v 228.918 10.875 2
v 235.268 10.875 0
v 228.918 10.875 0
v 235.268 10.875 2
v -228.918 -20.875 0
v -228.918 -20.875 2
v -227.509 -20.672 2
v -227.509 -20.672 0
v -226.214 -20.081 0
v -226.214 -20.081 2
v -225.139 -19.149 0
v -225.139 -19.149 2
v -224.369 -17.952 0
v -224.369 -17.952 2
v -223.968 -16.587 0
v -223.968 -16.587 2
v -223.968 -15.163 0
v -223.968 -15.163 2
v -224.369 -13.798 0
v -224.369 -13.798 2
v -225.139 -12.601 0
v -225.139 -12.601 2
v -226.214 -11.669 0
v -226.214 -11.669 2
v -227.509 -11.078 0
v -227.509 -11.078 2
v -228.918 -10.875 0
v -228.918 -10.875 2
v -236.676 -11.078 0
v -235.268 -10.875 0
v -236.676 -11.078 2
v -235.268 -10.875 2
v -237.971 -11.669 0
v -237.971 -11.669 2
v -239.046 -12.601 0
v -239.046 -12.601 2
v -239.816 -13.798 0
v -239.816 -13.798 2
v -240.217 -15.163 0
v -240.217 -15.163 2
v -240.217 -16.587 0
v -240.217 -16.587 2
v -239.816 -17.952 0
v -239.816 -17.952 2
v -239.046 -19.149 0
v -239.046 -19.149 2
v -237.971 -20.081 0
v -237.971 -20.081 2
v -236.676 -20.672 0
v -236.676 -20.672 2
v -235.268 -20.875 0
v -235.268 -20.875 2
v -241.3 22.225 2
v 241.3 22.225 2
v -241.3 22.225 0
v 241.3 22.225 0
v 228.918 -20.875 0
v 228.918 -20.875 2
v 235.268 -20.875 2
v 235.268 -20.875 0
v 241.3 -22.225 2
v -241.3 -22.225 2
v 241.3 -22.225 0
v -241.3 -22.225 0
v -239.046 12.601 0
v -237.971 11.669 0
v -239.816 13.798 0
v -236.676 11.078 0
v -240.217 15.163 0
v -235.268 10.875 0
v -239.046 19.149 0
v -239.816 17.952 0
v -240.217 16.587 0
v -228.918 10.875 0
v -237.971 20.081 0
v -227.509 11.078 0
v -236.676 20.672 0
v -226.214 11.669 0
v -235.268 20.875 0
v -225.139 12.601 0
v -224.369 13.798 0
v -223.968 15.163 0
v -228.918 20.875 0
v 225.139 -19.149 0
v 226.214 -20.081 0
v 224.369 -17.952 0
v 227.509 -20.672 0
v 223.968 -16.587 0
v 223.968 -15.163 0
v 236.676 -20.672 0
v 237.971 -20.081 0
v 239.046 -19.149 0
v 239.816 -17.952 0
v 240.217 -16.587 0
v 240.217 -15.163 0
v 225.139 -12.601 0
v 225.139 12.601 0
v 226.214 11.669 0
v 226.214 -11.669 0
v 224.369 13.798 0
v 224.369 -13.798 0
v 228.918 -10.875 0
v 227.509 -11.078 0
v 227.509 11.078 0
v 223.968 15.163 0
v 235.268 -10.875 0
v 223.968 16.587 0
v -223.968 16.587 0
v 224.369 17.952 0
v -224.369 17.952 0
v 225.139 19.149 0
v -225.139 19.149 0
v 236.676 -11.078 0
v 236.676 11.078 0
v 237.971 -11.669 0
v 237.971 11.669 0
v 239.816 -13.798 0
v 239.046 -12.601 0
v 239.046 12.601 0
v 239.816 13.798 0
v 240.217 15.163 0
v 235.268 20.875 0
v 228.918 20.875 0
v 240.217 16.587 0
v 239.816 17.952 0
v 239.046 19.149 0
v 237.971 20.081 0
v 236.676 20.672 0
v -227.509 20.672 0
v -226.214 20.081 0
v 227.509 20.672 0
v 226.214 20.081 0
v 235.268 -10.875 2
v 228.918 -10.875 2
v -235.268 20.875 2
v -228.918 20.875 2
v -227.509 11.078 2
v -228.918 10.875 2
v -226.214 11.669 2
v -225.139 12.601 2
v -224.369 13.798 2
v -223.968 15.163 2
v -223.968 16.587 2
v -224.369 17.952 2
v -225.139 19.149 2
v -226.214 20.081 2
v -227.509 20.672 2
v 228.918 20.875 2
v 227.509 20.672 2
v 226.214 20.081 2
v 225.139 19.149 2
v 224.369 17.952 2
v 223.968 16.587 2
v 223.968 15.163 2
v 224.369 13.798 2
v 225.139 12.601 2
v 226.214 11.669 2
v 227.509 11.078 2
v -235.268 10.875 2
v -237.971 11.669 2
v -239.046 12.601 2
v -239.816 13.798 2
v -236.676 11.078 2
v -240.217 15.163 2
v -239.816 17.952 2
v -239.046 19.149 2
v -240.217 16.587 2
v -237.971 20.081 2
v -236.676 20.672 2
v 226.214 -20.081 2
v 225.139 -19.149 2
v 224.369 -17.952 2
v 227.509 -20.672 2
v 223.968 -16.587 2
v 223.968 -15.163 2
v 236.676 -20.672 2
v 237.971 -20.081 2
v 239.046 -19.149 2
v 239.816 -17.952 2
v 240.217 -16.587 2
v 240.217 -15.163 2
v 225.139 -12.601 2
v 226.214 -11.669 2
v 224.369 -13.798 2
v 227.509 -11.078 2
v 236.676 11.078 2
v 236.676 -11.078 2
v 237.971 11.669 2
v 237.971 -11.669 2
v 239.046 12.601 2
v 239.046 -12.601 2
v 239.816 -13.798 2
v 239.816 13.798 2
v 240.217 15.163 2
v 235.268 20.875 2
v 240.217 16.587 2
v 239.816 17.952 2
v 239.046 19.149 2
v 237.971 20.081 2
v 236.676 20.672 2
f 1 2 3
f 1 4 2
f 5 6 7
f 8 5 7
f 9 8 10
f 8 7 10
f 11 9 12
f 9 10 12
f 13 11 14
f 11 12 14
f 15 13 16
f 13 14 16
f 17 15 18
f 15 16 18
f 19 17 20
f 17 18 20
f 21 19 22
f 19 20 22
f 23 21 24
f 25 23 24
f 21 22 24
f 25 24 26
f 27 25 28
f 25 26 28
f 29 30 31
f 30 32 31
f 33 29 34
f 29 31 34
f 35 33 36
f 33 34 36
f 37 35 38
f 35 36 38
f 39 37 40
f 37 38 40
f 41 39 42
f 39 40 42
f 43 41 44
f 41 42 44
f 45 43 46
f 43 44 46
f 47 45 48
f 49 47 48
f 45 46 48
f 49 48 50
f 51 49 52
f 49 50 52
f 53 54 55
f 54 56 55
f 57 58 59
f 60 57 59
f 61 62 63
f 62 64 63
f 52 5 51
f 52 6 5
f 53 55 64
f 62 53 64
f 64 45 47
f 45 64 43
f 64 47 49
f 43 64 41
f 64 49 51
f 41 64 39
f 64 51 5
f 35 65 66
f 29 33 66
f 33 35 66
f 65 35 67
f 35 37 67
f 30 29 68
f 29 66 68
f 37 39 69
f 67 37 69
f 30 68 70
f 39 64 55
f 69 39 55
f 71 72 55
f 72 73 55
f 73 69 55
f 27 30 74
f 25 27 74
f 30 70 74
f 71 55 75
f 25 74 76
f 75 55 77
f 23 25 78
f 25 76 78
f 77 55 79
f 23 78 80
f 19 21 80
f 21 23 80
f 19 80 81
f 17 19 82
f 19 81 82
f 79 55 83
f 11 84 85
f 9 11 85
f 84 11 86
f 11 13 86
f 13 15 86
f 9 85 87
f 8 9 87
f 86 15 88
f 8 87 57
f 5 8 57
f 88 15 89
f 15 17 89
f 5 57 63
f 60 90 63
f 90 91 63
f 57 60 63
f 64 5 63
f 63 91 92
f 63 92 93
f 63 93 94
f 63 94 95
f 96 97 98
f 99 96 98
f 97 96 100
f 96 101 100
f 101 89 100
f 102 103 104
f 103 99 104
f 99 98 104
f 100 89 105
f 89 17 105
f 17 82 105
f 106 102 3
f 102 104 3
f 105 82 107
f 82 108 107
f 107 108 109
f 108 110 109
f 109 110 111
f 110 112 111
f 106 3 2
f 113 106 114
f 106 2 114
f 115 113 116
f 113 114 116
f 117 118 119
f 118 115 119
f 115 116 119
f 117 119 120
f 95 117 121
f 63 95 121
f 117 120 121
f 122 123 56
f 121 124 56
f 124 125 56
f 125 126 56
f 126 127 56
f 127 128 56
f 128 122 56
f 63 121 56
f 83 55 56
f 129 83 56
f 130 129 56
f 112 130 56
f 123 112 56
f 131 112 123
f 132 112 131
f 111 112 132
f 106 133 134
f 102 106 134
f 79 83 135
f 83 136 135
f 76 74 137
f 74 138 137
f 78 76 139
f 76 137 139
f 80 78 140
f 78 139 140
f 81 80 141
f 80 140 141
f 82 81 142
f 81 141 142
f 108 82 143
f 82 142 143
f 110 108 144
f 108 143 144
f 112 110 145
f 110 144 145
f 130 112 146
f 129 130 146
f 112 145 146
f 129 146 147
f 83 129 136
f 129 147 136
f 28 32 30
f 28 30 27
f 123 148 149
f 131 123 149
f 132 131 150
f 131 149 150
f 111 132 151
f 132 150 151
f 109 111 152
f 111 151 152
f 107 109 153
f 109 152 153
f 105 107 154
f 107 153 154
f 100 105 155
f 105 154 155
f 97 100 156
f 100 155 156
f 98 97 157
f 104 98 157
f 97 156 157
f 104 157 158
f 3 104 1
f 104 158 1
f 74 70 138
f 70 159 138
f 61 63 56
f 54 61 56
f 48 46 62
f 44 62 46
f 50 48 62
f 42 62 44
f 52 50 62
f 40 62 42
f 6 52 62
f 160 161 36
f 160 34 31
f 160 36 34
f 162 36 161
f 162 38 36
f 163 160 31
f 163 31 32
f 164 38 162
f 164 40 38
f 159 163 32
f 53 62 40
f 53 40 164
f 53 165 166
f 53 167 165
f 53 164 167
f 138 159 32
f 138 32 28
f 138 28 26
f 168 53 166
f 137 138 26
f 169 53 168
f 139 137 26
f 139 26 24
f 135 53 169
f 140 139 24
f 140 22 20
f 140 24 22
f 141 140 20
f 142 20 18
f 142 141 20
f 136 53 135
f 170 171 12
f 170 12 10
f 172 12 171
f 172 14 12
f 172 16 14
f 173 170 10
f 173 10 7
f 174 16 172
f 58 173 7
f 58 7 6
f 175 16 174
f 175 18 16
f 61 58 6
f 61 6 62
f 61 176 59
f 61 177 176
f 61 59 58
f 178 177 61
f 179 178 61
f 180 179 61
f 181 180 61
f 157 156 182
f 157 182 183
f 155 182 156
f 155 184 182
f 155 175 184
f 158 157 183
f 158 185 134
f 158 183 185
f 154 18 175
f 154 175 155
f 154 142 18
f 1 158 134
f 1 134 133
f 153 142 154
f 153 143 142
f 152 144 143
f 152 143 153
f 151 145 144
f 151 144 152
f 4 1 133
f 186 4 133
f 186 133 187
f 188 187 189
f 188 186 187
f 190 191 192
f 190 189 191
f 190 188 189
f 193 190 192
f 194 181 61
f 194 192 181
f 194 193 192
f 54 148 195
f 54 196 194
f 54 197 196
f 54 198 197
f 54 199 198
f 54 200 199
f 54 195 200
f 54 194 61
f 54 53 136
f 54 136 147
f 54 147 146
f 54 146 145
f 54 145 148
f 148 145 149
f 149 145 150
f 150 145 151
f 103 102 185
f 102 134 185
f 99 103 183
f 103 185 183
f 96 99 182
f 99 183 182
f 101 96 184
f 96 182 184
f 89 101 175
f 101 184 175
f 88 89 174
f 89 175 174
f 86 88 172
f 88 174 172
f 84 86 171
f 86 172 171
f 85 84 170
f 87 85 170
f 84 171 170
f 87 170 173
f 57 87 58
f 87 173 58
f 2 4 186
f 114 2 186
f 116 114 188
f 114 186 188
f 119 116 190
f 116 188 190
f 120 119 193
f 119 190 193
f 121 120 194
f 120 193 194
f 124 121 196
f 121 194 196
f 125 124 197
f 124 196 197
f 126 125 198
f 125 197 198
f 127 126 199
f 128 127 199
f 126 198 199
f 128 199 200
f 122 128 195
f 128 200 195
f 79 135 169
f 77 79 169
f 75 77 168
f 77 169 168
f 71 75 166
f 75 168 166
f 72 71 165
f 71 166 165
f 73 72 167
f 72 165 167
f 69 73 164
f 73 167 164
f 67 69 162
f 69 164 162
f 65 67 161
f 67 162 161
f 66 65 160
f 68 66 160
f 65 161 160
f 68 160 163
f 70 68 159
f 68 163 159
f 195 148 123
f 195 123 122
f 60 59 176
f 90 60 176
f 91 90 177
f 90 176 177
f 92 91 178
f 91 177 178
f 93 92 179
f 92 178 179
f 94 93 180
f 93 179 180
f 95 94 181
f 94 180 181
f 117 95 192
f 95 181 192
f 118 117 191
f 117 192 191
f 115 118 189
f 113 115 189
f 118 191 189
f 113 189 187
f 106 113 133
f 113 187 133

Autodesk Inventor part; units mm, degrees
ref_plane "YZ Plane" through (0, 0, 0) normal (1, 0, 0) x (0, 1, 0)
ref_plane "XZ Plane" through (0, 0, 0) normal (0, 1, 0) x (-1, 0, 0)
ref_plane "XY Plane" through (0, 0, 0) normal (0, 0, 1) x (1, 0, 0)
sketch "Sketch1" plane through (0, 0, 0) normal (0, 0, 1) x (1, 0, 0)
  line L0 (-241.3, -22.225) -> (241.3, -22.225)
  line L1 (241.3, -22.225) -> (241.3, 22.225)
  line L2 (241.3, 22.225) -> (-241.3, 22.225)
  line L3 (-241.3, 22.225) -> (-241.3, -22.225)
  line L4 (-241.3, -22.225) -> (241.3, 22.225) construction
  line L5 (241.3, -22.225) -> (-241.3, 22.225) construction
  point P0 (0, 0)
  dimension "d0" = 482.6
  dimension "d1" = 44.45
extrude "Extrusion1" add sketch "Sketch1" along normal blind 2
sketch "Sketch2" plane through (0, 0, 2) normal (0, 0, 1) x (1, 0, 0)
  line L0 (-235.2675, 15.875) -> (-228.9175, 15.875) construction
  line L1 (-235.2675, 10.875) -> (-228.9175, 10.875)
  line L2 (-228.9175, 20.875) -> (-235.2675, 20.875)
  arc A0 (-235.2675, 20.875) -> (-235.2675, 10.875) centre (-235.2675, 15.875) ccw
  arc A1 (-228.9175, 10.875) -> (-228.9175, 20.875) centre (-228.9175, 15.875) ccw
  line L3 (241.3, 22.225) -> (-241.3, 22.225) projected
  line L4 (-241.3, 22.225) -> (-241.3, -22.225) projected
  line L5 (-241.3, 0) -> (241.3, 0) construction
  line L6 (0, 22.225) -> (0, -22.225) construction
  line L7 (-235.2675, -15.875) -> (-228.9175, -15.875) construction
  line L8 (-235.2675, -10.875) -> (-228.9175, -10.875)
  line L9 (-228.9175, -20.875) -> (-235.2675, -20.875)
  arc A2 (-235.2675, -10.875) -> (-235.2675, -20.875) centre (-235.2675, -15.875) ccw
  arc A3 (-228.9175, -20.875) -> (-228.9175, -10.875) centre (-228.9175, -15.875) ccw
  line L10 (235.2675, 15.875) -> (228.9175, 15.875) construction
  line L11 (235.2675, 10.875) -> (228.9175, 10.875)
  line L12 (228.9175, 20.875) -> (235.2675, 20.875)
  arc A4 (235.2675, 10.875) -> (235.2675, 20.875) centre (235.2675, 15.875) ccw
  arc A5 (228.9175, 20.875) -> (228.9175, 10.875) centre (228.9175, 15.875) ccw
  line L13 (235.2675, -15.875) -> (228.9175, -15.875) construction
  line L14 (235.2675, -10.875) -> (228.9175, -10.875)
  line L15 (228.9175, -20.875) -> (235.2675, -20.875)
  arc A6 (235.2675, -20.875) -> (235.2675, -10.875) centre (235.2675, -15.875) ccw
  arc A7 (228.9175, -10.875) -> (228.9175, -20.875) centre (228.9175, -15.875) ccw
  point P0 (0, 0)
  point P1 (-232.0925, 15.875)
  point P2 (-232.0925, -15.875)
  point P3 (232.0925, 15.875)
  point P4 (232.0925, -15.875)
  dimension "d13" = 5
  dimension "d14" = 6.35
  dimension "d15" = 6.35
  dimension "d16" = 9.2075
extrude "Extrusion2" cut sketch "Sketch2" against normal up to surface (2 mm away)
properties part number "PatchPanel_front"
